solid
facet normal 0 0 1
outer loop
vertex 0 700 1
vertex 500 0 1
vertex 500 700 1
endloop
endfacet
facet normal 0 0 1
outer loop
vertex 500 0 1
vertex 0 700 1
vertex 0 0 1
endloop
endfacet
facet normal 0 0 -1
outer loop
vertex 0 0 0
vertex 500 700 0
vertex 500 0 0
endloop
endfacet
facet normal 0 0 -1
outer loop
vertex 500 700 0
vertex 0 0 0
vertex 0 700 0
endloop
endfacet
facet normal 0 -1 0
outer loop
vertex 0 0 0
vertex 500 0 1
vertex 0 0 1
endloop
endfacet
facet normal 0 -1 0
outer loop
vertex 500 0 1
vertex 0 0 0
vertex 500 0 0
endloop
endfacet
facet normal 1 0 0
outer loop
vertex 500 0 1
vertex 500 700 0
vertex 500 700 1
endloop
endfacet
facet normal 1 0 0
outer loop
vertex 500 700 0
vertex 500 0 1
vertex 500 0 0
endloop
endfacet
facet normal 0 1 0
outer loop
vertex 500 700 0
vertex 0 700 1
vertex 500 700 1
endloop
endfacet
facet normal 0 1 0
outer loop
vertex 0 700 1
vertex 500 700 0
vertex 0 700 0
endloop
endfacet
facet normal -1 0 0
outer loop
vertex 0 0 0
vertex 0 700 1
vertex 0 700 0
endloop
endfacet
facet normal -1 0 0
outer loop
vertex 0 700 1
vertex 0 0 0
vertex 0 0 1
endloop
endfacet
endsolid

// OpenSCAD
//CUSTOMIZER VARIABLES

//1. Box X Length
X = 500;

//2. Box Y Length
Y = 700;

//3. HBox Z Height
Z = 1;

//CUSTOMIZER VARIABLES END

cube([X,Y,Z]);
